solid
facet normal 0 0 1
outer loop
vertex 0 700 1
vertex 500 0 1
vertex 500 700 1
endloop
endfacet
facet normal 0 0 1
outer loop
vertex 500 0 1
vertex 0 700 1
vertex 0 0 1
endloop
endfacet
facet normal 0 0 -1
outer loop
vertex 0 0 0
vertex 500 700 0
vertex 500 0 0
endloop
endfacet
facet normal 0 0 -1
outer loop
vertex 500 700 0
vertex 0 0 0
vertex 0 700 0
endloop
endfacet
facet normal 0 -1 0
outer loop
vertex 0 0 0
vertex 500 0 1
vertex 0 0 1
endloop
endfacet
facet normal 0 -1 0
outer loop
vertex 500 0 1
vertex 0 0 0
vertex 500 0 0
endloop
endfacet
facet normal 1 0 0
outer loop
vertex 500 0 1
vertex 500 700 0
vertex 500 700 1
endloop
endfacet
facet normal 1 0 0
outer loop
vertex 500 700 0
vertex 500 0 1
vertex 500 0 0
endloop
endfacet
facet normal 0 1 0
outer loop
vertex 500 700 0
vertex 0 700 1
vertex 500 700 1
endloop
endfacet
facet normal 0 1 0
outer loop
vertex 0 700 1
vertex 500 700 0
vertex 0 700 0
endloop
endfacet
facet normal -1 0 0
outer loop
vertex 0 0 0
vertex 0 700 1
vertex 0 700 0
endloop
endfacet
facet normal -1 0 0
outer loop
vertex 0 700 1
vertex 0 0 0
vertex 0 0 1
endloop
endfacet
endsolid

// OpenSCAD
//CUSTOMIZER VARIABLES

//1. Box X Length
X = 500;

//2. Box Y Length
Y = 700;

//3. HBox Z Height
Z = 1;

//CUSTOMIZER VARIABLES END

cube([X,Y,Z]);
